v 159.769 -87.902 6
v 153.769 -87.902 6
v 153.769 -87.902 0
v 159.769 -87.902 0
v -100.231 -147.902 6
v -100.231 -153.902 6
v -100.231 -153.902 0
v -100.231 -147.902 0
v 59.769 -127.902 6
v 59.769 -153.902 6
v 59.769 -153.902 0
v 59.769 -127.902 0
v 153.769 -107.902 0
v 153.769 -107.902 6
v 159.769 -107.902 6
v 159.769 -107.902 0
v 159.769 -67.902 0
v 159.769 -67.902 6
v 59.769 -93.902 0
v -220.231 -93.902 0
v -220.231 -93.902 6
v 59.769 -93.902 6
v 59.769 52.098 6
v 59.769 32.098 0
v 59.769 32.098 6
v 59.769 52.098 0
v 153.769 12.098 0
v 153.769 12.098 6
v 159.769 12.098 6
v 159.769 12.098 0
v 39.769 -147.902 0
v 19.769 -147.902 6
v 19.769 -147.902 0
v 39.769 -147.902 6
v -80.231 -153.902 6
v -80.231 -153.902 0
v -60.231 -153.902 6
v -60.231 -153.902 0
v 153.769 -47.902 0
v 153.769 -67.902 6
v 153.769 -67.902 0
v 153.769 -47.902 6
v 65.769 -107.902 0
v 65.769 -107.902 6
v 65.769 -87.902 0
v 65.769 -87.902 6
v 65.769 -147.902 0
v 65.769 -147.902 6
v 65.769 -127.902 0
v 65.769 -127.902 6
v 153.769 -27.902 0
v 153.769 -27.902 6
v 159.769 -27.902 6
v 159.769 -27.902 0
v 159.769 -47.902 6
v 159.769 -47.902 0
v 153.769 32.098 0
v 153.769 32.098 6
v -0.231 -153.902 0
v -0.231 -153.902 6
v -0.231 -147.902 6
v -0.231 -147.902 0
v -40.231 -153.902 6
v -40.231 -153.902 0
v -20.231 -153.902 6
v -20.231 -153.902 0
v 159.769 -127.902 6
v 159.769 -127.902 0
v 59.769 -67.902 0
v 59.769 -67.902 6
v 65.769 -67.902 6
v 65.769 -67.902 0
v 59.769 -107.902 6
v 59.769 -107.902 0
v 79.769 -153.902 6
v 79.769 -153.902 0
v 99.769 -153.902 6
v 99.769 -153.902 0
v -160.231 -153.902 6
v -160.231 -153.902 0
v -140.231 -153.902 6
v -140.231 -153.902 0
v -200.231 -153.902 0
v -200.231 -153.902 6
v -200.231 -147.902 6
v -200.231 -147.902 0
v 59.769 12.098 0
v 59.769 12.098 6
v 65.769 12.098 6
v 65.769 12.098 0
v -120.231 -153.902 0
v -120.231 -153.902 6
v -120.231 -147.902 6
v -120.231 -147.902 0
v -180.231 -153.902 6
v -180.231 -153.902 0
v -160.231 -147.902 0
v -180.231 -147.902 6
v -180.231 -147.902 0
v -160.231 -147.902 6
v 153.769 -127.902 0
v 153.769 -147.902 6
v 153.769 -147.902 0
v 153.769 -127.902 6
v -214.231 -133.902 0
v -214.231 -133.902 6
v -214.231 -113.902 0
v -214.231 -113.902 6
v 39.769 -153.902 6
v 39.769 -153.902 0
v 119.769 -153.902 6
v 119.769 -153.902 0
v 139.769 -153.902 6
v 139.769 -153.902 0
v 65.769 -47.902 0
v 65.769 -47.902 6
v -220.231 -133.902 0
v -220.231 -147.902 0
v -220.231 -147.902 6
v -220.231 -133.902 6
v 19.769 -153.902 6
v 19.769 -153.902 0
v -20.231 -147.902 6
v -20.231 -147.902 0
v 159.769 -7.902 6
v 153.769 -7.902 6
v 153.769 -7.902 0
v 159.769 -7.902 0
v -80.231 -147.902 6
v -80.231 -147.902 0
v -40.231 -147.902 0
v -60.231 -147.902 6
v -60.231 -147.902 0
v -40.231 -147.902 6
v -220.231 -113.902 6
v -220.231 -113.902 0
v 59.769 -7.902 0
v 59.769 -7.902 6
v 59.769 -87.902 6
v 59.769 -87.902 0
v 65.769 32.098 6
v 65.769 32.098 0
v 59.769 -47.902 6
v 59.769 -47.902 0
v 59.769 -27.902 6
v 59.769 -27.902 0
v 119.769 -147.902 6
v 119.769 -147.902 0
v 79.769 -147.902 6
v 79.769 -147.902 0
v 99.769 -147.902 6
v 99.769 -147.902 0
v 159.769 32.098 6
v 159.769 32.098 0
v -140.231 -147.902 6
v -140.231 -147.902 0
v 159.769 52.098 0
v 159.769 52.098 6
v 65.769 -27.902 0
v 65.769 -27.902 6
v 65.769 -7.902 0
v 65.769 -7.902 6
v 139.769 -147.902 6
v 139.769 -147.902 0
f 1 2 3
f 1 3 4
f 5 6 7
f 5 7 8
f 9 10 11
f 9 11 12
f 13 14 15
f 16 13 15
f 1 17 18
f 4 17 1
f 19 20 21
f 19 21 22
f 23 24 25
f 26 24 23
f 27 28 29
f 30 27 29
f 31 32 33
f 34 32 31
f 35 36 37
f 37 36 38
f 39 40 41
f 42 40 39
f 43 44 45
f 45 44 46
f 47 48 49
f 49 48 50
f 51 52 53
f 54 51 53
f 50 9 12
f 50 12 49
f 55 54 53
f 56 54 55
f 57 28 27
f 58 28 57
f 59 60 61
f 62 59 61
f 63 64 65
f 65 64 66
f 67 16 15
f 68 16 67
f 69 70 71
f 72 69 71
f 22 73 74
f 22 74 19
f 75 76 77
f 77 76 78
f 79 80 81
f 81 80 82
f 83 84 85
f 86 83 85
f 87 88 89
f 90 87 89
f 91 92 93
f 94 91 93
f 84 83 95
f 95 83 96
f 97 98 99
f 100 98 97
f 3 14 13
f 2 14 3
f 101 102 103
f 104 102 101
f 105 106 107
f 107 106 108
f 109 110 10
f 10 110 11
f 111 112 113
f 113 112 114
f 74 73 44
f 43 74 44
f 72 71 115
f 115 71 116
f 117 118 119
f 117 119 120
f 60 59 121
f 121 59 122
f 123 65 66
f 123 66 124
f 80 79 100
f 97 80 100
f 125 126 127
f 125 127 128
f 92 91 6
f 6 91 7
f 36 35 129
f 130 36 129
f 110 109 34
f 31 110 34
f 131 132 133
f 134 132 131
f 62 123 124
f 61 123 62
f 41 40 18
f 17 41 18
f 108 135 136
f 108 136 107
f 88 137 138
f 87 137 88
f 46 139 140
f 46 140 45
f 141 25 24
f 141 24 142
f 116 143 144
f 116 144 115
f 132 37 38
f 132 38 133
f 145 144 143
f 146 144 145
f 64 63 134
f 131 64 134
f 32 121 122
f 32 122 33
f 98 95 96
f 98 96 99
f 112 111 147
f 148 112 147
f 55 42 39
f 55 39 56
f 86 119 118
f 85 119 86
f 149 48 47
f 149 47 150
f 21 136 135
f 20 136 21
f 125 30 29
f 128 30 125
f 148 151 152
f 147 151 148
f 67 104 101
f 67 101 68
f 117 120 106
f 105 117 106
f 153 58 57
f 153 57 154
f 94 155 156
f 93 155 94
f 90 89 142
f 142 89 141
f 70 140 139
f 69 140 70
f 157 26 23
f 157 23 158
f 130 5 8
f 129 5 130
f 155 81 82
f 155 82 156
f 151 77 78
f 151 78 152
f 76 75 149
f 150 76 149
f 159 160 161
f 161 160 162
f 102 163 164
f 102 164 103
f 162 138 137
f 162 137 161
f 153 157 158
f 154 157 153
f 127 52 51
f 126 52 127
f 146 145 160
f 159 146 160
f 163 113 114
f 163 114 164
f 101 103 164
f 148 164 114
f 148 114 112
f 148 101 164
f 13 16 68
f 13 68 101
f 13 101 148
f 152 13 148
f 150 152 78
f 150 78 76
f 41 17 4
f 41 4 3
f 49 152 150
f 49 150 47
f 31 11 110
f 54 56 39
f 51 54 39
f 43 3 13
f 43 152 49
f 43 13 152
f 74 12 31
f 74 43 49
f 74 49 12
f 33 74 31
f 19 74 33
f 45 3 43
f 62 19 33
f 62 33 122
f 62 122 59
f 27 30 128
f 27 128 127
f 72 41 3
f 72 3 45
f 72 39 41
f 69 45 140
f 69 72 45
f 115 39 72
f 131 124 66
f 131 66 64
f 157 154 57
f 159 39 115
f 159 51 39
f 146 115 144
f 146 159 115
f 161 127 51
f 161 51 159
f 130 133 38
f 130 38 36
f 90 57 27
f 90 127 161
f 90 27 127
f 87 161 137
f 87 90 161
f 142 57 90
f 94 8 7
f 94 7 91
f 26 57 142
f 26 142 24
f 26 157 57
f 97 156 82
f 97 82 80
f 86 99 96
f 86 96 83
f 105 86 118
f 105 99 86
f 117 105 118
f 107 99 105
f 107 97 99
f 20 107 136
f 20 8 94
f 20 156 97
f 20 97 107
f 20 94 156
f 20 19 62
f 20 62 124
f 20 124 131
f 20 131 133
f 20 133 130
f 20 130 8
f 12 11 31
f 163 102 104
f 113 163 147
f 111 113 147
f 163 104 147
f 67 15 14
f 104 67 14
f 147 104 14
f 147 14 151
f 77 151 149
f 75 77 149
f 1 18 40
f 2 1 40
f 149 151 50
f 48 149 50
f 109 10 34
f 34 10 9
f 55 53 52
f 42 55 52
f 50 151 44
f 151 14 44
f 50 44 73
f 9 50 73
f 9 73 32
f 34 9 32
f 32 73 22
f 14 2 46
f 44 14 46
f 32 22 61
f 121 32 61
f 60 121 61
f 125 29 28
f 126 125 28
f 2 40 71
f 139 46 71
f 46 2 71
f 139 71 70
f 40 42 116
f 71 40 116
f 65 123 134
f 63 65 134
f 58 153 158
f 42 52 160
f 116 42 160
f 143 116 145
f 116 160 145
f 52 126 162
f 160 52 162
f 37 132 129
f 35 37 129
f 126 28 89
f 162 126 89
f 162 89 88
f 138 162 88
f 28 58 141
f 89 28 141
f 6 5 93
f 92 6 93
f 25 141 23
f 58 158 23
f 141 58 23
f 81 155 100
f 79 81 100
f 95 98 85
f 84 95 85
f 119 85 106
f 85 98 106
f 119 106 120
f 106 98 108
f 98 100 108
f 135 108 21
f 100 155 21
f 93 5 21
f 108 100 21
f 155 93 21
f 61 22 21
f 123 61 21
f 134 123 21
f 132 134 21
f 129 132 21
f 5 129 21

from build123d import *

# Parameters (mm, degrees)
BOSS_EXTRUDE1_DEPTH = 6
SKETCH2_W           = 20
SKETCH2_H           = 6
CUT_EXTRUDE1_DEPTH  = 10
LPATTERN1_COUNT     = 10
LPATTERN1_PITCH     = 40
SKETCH3_W           = 6
SKETCH3_H           = 20
CUT_EXTRUDE2_DEPTH  = 10
SKETCH4_W           = 6
SKETCH4_H           = 20
CUT_EXTRUDE3_DEPTH  = 10
LPATTERN2_COUNT     = 5
LPATTERN2_PITCH     = 40
SKETCH5_W           = 6
SKETCH5_H           = 20
CUT_EXTRUDE4_DEPTH  = 10
LPATTERN3_COUNT     = 5
LPATTERN3_PITCH     = 40


with BuildPart() as part:
    # Sketch1 → Boss-Extrude1 (new body)
    with BuildSketch(Plane.XY):
        Polygon((-220.231213873, -93.901734104), (59.768786127, -93.901734104), (59.768786127, 52.098265896), (159.768786127, 52.098265896), (159.768786127, -153.901734104), (59.768786127, -153.901734104), (-220.231213873, -153.901734104), align=None)
    extrude(amount=BOSS_EXTRUDE1_DEPTH)

    # Sketch2 → Cut-Extrude1 (cut)
    with BuildSketch(Plane.XY.offset(6)):
        with Locations((-210.231213873, -150.901734104)):
            Rectangle(SKETCH2_W, SKETCH2_H)
    cut_extrude1 = extrude(amount=-CUT_EXTRUDE1_DEPTH, mode=Mode.SUBTRACT)

    # LPattern1: Cut-Extrude1 ×10
    with Locations(*[(i * LPATTERN1_PITCH, 0, 0) for i in range(1, LPATTERN1_COUNT)]):
        add(cut_extrude1, mode=Mode.SUBTRACT)

    # Sketch3 → Cut-Extrude2 (cut)
    with BuildSketch(Plane.XY.offset(6)):
        with Locations((-217.231213873, -123.901734104)):
            Rectangle(SKETCH3_W, SKETCH3_H)
    extrude(amount=-CUT_EXTRUDE2_DEPTH, mode=Mode.SUBTRACT)

    # Sketch4 → Cut-Extrude3 (cut)
    with BuildSketch(Plane.XY.offset(6)):
        with Locations((156.768786127, 22.098265896)):
            Rectangle(SKETCH4_W, SKETCH4_H)
    cut_extrude3 = extrude(amount=-CUT_EXTRUDE3_DEPTH, mode=Mode.SUBTRACT)

    # LPattern2: Cut-Extrude3 ×5
    with Locations(*[(0, -i * LPATTERN2_PITCH, 0) for i in range(1, LPATTERN2_COUNT)]):
        add(cut_extrude3, mode=Mode.SUBTRACT)

    # Sketch5 → Cut-Extrude4 (cut)
    with BuildSketch(Plane.XY.offset(6)):
        with Locations((62.768786127, 22.098265896)):
            Rectangle(SKETCH5_W, SKETCH5_H)
    cut_extrude4 = extrude(amount=-CUT_EXTRUDE4_DEPTH, mode=Mode.SUBTRACT)

    # LPattern3: Cut-Extrude4 ×5
    with Locations(*[(0, -i * LPATTERN3_PITCH, 0) for i in range(1, LPATTERN3_COUNT)]):
        add(cut_extrude4, mode=Mode.SUBTRACT)


solid = part.part
